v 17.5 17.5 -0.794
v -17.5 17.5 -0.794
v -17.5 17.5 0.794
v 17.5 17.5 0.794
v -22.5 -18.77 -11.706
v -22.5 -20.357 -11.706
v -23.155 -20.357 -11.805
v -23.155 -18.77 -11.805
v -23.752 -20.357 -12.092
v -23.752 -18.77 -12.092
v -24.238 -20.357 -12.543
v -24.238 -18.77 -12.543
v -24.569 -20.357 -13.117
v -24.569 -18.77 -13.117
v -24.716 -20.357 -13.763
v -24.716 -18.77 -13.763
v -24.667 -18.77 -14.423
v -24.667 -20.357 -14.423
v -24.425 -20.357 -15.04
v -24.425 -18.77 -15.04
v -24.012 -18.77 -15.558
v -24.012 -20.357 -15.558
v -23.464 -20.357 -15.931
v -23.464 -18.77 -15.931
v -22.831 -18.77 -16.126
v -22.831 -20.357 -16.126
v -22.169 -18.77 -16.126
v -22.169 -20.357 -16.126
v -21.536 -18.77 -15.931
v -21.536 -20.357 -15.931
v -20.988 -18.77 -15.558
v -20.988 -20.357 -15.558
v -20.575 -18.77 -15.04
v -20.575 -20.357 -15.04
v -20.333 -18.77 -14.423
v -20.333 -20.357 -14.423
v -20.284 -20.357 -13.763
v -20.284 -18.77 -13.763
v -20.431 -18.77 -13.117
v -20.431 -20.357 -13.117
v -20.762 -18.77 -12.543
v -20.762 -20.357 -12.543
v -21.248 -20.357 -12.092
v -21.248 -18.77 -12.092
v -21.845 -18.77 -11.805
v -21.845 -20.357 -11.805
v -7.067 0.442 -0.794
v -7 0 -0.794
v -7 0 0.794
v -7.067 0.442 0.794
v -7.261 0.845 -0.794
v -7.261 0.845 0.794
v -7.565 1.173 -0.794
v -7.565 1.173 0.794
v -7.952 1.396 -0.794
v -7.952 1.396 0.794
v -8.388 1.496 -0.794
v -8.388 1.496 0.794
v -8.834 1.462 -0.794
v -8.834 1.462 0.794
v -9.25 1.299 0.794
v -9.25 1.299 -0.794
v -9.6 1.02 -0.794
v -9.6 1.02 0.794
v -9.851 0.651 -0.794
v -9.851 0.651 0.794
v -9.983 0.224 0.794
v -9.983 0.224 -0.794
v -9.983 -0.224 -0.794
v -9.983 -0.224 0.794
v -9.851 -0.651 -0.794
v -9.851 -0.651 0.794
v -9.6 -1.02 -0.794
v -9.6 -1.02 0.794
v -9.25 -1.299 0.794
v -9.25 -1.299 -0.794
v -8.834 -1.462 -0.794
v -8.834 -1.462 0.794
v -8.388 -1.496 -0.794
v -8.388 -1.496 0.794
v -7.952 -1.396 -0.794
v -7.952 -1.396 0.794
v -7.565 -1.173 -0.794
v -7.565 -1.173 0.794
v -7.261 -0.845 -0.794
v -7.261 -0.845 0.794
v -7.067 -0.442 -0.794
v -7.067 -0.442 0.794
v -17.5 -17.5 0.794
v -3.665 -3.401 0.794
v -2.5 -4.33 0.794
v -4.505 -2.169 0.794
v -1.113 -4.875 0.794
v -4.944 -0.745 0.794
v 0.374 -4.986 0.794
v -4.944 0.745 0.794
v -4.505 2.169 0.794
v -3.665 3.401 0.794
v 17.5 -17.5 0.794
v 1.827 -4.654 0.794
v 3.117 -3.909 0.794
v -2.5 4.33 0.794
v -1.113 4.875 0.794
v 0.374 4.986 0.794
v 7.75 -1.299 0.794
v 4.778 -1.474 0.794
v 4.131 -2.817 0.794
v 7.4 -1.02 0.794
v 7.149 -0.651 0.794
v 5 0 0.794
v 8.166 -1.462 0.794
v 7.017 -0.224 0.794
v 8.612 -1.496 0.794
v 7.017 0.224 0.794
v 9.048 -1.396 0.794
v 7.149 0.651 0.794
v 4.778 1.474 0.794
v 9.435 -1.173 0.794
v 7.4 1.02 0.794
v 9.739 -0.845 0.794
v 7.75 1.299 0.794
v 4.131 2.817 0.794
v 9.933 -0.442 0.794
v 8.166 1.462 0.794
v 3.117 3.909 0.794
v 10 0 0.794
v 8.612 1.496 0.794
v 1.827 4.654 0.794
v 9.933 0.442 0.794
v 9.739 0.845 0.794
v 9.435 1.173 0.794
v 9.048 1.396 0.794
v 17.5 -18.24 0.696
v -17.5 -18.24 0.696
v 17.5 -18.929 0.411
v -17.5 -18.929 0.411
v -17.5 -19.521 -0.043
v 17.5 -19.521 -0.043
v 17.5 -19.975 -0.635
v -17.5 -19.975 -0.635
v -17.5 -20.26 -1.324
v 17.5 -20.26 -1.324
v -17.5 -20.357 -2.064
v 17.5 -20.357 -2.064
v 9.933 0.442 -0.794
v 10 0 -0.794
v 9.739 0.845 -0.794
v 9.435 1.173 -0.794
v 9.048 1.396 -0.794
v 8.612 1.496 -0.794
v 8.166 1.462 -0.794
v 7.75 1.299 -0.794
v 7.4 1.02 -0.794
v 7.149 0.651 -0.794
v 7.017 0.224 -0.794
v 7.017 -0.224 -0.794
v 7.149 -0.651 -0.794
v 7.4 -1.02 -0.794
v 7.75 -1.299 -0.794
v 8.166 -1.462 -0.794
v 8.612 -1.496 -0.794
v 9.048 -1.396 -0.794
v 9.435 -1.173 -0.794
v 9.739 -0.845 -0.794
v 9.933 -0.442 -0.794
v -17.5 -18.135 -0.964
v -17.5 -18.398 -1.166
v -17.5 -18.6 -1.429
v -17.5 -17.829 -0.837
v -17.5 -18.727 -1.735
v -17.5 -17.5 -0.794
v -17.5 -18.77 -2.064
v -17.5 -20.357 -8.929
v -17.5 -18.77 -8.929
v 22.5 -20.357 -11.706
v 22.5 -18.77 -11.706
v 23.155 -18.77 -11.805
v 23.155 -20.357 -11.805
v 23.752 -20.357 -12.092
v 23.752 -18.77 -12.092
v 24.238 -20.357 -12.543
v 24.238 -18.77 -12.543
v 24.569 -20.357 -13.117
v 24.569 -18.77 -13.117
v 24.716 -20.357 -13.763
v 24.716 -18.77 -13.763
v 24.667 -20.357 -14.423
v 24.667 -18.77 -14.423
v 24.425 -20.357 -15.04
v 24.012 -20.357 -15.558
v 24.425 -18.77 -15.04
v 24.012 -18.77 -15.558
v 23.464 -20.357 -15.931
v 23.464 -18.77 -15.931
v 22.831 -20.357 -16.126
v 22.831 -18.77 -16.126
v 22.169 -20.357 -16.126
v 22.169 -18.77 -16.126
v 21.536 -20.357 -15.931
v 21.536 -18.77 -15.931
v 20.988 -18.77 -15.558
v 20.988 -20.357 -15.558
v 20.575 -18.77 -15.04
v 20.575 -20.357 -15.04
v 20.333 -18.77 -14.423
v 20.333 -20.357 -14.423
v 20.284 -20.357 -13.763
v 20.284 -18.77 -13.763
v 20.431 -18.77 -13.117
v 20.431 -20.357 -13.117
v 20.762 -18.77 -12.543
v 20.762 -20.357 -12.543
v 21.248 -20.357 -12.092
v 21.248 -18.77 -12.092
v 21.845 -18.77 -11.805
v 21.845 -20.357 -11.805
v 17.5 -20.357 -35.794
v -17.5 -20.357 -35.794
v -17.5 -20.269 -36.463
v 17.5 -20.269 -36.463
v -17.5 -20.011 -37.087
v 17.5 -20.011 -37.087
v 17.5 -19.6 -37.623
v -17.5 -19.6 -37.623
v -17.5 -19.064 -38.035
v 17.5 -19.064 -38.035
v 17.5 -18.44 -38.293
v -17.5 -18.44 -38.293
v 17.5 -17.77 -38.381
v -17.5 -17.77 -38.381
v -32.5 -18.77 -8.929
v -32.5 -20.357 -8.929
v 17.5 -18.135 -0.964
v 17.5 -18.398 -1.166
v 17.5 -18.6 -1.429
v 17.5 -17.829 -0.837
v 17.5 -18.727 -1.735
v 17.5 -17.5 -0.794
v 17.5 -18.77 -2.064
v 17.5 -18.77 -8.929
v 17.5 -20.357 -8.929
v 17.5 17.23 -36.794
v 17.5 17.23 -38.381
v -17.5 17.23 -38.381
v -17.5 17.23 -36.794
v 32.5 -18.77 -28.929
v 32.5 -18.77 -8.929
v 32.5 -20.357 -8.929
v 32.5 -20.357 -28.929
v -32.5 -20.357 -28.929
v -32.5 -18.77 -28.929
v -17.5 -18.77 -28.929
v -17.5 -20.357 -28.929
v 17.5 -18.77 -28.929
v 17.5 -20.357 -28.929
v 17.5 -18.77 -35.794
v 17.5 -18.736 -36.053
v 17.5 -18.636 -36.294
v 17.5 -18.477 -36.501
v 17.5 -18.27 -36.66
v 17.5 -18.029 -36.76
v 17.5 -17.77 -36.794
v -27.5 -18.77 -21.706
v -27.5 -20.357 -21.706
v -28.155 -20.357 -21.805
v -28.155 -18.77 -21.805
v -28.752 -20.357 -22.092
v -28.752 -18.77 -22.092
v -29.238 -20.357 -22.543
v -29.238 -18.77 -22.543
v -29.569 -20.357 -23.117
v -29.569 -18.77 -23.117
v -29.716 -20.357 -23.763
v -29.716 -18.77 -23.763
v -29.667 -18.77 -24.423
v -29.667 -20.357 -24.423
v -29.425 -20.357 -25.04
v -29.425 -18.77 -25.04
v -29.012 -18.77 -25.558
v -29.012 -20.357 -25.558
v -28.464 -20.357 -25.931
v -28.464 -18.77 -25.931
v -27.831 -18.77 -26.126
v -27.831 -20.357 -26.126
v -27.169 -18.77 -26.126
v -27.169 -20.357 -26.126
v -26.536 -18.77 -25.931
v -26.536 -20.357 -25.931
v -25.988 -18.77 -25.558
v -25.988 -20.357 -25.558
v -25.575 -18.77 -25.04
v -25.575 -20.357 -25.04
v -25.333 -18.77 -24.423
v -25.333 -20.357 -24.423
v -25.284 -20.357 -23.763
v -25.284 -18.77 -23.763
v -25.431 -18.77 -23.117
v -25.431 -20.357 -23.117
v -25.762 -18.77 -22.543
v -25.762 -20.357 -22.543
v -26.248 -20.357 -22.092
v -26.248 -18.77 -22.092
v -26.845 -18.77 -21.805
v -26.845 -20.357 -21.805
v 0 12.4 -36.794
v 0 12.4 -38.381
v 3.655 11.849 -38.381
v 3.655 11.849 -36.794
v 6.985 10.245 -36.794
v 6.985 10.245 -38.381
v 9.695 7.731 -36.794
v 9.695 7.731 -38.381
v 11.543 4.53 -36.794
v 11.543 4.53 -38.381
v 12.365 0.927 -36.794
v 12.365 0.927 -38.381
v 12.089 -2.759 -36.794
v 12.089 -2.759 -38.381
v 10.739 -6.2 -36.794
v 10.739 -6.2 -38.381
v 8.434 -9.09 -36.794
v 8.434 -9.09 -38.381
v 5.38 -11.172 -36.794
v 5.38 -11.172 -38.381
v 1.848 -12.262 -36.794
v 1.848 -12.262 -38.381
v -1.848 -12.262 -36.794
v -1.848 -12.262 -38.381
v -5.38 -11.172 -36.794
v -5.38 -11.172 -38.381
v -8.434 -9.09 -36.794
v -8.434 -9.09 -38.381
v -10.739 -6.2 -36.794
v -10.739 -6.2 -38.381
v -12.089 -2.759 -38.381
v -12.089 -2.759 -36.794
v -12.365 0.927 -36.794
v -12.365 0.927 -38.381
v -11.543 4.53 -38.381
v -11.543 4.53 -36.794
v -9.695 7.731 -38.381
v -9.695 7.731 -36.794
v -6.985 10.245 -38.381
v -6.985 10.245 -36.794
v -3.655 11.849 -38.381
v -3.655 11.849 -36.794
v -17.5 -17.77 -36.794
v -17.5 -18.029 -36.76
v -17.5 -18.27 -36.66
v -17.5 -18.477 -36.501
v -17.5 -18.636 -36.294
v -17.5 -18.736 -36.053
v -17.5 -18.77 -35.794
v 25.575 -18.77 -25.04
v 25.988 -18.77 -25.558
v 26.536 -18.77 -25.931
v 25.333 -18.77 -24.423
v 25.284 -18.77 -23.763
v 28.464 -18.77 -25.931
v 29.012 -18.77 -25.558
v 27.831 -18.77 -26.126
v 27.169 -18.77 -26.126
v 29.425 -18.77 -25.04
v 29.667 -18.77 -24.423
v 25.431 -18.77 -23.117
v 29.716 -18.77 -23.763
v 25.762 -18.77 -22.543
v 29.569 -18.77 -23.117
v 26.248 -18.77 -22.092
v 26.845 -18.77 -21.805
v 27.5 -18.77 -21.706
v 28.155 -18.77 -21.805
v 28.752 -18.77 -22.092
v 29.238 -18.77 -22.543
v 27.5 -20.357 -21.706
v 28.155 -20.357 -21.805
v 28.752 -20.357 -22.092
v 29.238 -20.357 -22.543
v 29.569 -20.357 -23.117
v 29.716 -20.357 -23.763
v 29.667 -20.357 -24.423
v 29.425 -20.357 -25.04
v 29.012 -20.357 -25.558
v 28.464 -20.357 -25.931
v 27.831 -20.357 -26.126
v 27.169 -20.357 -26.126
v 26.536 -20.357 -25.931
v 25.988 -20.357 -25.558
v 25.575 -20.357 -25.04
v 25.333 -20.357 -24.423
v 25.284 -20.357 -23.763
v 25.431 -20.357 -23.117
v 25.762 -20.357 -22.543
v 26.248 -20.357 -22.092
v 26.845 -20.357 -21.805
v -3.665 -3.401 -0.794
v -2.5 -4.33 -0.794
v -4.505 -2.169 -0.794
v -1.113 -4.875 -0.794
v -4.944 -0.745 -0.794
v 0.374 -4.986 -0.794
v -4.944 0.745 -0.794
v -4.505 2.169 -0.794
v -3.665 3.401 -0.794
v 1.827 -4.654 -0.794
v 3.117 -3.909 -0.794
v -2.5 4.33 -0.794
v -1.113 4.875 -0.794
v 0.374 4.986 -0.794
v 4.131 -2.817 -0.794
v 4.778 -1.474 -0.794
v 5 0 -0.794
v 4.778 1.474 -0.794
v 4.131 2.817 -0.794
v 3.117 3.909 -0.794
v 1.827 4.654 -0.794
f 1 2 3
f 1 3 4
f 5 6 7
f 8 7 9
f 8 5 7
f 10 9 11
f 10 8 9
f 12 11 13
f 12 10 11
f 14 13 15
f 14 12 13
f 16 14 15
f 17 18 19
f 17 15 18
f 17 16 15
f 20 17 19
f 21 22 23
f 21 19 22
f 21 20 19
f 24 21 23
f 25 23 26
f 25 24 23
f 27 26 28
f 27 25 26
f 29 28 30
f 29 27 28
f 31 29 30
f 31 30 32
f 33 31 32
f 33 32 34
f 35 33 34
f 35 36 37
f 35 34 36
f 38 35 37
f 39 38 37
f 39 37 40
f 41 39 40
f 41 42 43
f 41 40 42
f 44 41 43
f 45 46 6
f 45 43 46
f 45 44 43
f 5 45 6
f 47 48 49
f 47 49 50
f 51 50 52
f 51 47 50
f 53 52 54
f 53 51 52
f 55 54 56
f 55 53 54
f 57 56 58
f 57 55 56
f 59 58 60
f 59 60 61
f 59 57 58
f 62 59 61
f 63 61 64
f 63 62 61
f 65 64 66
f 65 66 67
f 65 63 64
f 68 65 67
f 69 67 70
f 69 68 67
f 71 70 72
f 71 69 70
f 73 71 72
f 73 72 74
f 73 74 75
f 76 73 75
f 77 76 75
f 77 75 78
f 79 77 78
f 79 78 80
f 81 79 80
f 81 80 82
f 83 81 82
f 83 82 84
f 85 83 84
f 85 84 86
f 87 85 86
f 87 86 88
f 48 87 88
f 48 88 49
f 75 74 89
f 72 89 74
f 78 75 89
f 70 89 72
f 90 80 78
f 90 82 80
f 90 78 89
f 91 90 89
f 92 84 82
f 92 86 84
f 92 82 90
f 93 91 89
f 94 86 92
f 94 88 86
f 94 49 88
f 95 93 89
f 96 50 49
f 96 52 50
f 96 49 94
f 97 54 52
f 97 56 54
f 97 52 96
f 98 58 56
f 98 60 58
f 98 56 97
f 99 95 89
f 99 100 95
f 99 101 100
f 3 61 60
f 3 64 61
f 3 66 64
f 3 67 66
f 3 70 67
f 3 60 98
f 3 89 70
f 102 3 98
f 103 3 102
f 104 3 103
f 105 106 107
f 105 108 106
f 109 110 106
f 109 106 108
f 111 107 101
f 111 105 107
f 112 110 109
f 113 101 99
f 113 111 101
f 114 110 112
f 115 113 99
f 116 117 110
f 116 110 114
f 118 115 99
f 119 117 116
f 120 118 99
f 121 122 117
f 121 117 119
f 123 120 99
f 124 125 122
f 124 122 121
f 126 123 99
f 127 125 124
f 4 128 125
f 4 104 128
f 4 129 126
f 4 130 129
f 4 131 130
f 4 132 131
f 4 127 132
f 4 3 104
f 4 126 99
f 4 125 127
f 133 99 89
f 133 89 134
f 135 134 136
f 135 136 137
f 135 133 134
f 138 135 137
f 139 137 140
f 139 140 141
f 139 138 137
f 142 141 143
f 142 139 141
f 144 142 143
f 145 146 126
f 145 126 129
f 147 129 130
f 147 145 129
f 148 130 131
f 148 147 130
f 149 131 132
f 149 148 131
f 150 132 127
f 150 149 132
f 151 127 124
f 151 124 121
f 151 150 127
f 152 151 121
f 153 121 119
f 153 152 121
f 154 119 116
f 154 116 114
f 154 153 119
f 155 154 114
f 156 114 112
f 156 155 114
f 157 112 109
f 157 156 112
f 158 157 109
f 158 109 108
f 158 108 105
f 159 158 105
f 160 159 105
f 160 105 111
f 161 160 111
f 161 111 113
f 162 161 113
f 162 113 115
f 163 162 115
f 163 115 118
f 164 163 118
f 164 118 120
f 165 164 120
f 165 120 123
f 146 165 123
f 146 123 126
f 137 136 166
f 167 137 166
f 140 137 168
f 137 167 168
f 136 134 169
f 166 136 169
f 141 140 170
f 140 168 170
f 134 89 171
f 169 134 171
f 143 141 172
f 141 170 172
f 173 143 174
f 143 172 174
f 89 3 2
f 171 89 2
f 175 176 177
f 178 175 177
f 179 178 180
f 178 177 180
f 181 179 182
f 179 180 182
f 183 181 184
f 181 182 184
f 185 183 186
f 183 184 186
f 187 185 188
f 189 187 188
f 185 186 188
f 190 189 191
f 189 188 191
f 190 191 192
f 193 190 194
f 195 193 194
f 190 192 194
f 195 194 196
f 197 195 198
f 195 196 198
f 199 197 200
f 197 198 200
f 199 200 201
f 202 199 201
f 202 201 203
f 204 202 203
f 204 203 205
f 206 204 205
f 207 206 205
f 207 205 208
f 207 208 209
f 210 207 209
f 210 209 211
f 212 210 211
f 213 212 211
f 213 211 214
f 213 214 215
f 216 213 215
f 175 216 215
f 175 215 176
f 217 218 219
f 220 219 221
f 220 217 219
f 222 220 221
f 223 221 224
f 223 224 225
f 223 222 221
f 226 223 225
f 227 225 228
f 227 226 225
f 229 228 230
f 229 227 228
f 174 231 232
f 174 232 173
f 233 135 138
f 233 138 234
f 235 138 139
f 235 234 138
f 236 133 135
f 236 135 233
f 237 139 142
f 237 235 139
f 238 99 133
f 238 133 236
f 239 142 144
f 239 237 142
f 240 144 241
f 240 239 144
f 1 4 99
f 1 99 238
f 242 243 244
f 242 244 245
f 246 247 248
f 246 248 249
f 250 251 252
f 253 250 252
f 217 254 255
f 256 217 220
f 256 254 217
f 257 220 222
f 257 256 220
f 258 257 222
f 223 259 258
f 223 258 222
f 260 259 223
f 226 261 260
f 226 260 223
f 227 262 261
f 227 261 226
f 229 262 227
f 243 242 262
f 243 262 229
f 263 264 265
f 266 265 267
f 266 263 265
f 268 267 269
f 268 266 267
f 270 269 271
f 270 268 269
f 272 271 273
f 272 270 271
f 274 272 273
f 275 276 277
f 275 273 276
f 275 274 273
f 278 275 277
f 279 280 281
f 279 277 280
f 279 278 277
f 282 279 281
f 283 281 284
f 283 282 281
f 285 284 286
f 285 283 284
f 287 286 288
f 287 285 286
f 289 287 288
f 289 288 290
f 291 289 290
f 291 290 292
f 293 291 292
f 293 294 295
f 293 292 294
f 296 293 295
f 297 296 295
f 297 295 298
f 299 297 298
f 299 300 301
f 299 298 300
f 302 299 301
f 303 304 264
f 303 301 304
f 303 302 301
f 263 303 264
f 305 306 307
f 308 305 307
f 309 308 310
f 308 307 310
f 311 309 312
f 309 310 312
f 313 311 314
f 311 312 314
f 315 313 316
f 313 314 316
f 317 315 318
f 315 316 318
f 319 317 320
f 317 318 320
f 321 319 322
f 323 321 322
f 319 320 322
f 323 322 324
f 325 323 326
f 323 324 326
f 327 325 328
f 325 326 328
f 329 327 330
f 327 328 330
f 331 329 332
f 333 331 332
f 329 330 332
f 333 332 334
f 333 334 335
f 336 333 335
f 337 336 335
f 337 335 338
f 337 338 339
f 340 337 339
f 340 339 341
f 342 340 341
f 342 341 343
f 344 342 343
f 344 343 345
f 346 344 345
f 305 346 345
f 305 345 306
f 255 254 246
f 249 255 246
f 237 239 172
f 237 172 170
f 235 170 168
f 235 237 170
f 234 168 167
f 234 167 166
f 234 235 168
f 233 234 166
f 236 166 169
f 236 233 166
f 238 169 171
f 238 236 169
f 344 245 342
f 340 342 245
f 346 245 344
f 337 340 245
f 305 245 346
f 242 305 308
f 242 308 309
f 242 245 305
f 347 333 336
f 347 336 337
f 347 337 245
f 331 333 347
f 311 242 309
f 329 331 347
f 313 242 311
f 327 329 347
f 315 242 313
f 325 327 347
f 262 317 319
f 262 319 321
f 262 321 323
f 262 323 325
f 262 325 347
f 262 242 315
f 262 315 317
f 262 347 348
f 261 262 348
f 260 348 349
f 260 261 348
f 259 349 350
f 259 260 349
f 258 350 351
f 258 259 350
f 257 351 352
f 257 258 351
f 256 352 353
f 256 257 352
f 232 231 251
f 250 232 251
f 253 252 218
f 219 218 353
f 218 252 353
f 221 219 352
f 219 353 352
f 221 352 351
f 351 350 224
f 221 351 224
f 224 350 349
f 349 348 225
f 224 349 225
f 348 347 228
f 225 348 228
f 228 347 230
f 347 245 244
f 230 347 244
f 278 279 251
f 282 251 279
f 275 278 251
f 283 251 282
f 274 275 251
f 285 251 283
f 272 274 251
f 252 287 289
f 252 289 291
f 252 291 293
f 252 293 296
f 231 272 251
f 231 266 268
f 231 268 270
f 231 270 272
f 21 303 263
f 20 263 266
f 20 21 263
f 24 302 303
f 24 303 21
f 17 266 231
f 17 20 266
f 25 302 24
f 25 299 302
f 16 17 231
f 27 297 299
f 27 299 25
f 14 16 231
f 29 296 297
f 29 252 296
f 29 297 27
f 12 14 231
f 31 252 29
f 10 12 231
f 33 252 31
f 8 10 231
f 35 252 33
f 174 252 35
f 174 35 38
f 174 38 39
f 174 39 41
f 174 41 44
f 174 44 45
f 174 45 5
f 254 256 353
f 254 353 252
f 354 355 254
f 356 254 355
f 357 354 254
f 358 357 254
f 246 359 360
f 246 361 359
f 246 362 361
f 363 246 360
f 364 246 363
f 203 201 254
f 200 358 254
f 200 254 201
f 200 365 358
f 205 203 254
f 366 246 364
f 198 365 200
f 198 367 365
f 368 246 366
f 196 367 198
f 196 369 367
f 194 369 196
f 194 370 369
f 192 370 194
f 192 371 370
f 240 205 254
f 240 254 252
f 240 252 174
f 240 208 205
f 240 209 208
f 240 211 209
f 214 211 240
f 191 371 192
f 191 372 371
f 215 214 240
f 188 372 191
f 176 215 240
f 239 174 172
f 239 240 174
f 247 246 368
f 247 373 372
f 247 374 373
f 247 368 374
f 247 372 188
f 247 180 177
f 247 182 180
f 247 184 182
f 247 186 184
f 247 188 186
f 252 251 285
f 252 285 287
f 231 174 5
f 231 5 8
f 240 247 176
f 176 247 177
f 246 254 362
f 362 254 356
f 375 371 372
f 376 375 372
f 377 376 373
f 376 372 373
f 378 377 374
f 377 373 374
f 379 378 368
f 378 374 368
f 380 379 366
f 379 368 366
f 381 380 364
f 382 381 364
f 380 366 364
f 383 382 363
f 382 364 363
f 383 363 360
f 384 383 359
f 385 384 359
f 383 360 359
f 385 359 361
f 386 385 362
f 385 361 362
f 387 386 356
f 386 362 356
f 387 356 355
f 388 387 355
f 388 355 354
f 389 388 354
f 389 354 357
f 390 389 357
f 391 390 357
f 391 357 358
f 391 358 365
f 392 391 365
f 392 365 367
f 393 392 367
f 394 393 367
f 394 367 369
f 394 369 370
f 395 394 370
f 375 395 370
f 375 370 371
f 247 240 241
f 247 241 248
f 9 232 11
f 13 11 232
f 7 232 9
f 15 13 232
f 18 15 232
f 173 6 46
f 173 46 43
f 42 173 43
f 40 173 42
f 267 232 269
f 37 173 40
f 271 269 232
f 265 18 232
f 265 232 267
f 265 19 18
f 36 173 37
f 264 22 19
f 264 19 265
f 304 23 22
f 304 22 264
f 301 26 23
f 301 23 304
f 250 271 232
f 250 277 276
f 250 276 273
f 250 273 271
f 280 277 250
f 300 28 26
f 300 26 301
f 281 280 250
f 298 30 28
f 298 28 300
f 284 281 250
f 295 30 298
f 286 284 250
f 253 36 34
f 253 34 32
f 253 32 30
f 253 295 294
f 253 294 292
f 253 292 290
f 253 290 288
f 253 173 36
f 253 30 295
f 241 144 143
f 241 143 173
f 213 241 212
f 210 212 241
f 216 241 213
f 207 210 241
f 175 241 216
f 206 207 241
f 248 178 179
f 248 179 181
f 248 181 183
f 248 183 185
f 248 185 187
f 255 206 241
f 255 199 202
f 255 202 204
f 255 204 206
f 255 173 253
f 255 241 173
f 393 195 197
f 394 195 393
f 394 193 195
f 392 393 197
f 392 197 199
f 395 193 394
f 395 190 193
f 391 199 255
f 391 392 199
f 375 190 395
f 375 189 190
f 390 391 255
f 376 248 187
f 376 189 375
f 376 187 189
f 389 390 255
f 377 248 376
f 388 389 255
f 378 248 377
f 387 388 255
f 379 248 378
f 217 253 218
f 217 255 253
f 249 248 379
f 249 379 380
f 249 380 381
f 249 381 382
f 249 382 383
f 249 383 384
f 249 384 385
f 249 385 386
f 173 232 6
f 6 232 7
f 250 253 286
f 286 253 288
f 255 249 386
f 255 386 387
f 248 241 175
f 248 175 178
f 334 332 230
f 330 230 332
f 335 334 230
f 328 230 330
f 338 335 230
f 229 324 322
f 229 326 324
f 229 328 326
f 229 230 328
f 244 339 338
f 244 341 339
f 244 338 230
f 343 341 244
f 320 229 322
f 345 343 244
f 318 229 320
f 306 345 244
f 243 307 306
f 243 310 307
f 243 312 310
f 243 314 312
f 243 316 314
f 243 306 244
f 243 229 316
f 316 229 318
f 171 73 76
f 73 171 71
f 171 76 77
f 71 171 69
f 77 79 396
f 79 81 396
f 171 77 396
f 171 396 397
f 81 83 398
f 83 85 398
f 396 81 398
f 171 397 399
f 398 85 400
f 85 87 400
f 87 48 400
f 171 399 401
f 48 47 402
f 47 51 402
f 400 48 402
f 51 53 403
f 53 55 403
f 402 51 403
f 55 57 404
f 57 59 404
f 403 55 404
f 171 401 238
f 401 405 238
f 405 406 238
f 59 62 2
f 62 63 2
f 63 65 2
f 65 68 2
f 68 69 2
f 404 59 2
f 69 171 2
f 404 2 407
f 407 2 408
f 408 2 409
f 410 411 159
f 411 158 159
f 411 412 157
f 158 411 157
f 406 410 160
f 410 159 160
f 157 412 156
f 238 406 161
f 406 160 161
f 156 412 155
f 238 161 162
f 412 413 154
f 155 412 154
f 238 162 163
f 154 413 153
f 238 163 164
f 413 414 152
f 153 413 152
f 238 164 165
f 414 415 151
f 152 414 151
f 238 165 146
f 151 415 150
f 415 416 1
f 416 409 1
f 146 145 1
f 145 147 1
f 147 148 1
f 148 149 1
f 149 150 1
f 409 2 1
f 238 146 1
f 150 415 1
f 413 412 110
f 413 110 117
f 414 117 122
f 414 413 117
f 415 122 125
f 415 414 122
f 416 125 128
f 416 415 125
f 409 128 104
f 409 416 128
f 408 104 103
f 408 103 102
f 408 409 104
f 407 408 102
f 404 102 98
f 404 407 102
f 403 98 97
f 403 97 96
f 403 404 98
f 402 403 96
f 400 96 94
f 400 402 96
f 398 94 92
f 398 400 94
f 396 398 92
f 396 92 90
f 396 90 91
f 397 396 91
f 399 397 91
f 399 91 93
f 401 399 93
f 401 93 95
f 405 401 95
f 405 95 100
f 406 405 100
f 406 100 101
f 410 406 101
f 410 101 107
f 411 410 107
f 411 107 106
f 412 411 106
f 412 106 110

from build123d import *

# Parameters (mm, degrees)
SKETCH1_W                  = 35
SKETCH1_H                  = 35
SKETCH1_R                  = 1.5
SKETCH1_R_2                = 5
BOSS_EXTRUDE1_DEPTH        = 0.79375
CONVERT_SOLID2_START       = -0.79375
CONVERT_SOLID2_OUTLINE_W   = 35
CONVERT_SOLID2_OUTLINE_H   = 35
CONVERT_SOLID2_OUTLINE_R   = 1.5
CONVERT_SOLID2_OUTLINE_R_2 = 5
CONVERT_SOLID2_DEPTH       = 0.79375
EDGE_FLANGE1_DEPTH         = 35
EDGE_FLANGE2_DEPTH         = 35
SKETCH24_R                 = 12.4
CUT_EXTRUDE1_DEPTH         = 10
SKETCH29_W                 = 15
SKETCH29_H                 = 20
TAB1_DEPTH                 = 1.5875
SKETCH32_W                 = 15
SKETCH32_H                 = 20
TAB2_DEPTH                 = 1.5875
SKETCH35_R                 = 2.2225
CUT_EXTRUDE2_DEPTH         = 10


# Read off the part's stored shape, not the designer's step: Convert-Solid2
# Sheet-metal steps are written as plain solids
with BuildPart() as part:
    # Sketch1 → Boss-Extrude1 (new body)
    with BuildSketch(Plane.XY):
        Rectangle(SKETCH1_W, SKETCH1_H)
        with Locations((-8.5, 0)):
            Circle(SKETCH1_R, mode=Mode.SUBTRACT)
        with Locations((8.5, 0)):
            Circle(SKETCH1_R, mode=Mode.SUBTRACT)
        Circle(SKETCH1_R_2, mode=Mode.SUBTRACT)
    extrude(amount=BOSS_EXTRUDE1_DEPTH)

    # Convert-Solid2 outline → Convert-Solid2 (add)
    with BuildSketch(Plane.XY.offset(CONVERT_SOLID2_START)):
        Rectangle(CONVERT_SOLID2_OUTLINE_W, CONVERT_SOLID2_OUTLINE_H)
        with Locations((-8.5, 0)):
            Circle(CONVERT_SOLID2_OUTLINE_R, mode=Mode.SUBTRACT)
        Circle(CONVERT_SOLID2_OUTLINE_R_2, mode=Mode.SUBTRACT)
        with Locations((8.5, 0)):
            Circle(CONVERT_SOLID2_OUTLINE_R, mode=Mode.SUBTRACT)
    extrude(amount=CONVERT_SOLID2_DEPTH)

    # Edge-Flange1 section (across the edge) → Edge-Flange1 (add)
    with BuildSketch(Plane(origin=(17.5, -18.77, -0.79375), x_dir=(0, 1, 0), z_dir=(-1, 0, 0))):
        with BuildLine():
            Line((-1.5875, 1.27), (-1.5875, 35))
            Line((-1.5875, 35), (0, 35))
            Line((0, 35), (0, 1.27))
            ThreePointArc((0, 1.27), (0.371974388, 0.371974388), (1.27, 0))
            Line((1.27, 0), (1.27, -1.5875))
            ThreePointArc((1.27, -1.5875), (-0.750557627, -0.750557627), (-1.5875, 1.27))
        make_face()
    extrude(amount=EDGE_FLANGE1_DEPTH)

    # Edge-Flange2 section (across the edge) → Edge-Flange2 (add)
    with BuildSketch(Plane(origin=(17.5, -18.77, -36.79375), x_dir=(0, 0, 1), z_dir=(-1, 0, 0))):
        with BuildLine():
            Line((-1.5875, 1), (-1.5875, 36))
            Line((-1.5875, 36), (0, 36))
            Line((0, 36), (0, 1))
            ThreePointArc((0, 1), (0.292893219, 0.292893219), (1, 0))
            Line((1, 0), (1, -1.5875))
            ThreePointArc((1, -1.5875), (-0.829638796, -0.829638796), (-1.5875, 1))
        make_face()
    extrude(amount=EDGE_FLANGE2_DEPTH)

    # Sketch24 → Cut-Extrude1 (cut)
    with BuildSketch(Plane(origin=(0, 0, -38.38125), x_dir=(-1, 0, 0), z_dir=(0, 0, -1))):
        with Locations(Location((0, 0, 0), (0, 0, 90))):
            Circle(SKETCH24_R)
    extrude(amount=-CUT_EXTRUDE1_DEPTH, mode=Mode.SUBTRACT)

    # Sketch29 → Tab1 (add)
    with BuildSketch(Plane(origin=(0, -18.77, 0), x_dir=(1, 0, 0), z_dir=(0, 1, 0))):
        with Locations((25, 18.92875)):
            Rectangle(SKETCH29_W, SKETCH29_H)
    extrude(amount=-TAB1_DEPTH)

    # Sketch32 → Tab2 (add)
    with BuildSketch(Plane(origin=(0, -18.77, 0), x_dir=(1, 0, 0), z_dir=(0, 1, 0))):
        with Locations((-25, 18.92875)):
            Rectangle(SKETCH32_W, SKETCH32_H)
    extrude(amount=-TAB2_DEPTH)

    # Sketch35 → Cut-Extrude2 (cut)
    with BuildSketch(Plane(origin=(0, -18.77, 0), x_dir=(1, 0, 0), z_dir=(0, 1, 0))):
        with Locations(Location((22.5, 13.92875, 0), (0, 0, 270))):
            Circle(SKETCH35_R)
        with Locations(Location((27.5, 23.92875, 0), (0, 0, 270))):
            Circle(SKETCH35_R)
    cut_extrude2 = extrude(amount=-CUT_EXTRUDE2_DEPTH, mode=Mode.SUBTRACT)

    # Mirror1: Cut-Extrude2 across plane
    add(cut_extrude2.mirror(Plane(origin=(0, 0, 0), x_dir=(0, 0, 1), z_dir=(1, 0, 0))), mode=Mode.SUBTRACT)


solid = part.part
